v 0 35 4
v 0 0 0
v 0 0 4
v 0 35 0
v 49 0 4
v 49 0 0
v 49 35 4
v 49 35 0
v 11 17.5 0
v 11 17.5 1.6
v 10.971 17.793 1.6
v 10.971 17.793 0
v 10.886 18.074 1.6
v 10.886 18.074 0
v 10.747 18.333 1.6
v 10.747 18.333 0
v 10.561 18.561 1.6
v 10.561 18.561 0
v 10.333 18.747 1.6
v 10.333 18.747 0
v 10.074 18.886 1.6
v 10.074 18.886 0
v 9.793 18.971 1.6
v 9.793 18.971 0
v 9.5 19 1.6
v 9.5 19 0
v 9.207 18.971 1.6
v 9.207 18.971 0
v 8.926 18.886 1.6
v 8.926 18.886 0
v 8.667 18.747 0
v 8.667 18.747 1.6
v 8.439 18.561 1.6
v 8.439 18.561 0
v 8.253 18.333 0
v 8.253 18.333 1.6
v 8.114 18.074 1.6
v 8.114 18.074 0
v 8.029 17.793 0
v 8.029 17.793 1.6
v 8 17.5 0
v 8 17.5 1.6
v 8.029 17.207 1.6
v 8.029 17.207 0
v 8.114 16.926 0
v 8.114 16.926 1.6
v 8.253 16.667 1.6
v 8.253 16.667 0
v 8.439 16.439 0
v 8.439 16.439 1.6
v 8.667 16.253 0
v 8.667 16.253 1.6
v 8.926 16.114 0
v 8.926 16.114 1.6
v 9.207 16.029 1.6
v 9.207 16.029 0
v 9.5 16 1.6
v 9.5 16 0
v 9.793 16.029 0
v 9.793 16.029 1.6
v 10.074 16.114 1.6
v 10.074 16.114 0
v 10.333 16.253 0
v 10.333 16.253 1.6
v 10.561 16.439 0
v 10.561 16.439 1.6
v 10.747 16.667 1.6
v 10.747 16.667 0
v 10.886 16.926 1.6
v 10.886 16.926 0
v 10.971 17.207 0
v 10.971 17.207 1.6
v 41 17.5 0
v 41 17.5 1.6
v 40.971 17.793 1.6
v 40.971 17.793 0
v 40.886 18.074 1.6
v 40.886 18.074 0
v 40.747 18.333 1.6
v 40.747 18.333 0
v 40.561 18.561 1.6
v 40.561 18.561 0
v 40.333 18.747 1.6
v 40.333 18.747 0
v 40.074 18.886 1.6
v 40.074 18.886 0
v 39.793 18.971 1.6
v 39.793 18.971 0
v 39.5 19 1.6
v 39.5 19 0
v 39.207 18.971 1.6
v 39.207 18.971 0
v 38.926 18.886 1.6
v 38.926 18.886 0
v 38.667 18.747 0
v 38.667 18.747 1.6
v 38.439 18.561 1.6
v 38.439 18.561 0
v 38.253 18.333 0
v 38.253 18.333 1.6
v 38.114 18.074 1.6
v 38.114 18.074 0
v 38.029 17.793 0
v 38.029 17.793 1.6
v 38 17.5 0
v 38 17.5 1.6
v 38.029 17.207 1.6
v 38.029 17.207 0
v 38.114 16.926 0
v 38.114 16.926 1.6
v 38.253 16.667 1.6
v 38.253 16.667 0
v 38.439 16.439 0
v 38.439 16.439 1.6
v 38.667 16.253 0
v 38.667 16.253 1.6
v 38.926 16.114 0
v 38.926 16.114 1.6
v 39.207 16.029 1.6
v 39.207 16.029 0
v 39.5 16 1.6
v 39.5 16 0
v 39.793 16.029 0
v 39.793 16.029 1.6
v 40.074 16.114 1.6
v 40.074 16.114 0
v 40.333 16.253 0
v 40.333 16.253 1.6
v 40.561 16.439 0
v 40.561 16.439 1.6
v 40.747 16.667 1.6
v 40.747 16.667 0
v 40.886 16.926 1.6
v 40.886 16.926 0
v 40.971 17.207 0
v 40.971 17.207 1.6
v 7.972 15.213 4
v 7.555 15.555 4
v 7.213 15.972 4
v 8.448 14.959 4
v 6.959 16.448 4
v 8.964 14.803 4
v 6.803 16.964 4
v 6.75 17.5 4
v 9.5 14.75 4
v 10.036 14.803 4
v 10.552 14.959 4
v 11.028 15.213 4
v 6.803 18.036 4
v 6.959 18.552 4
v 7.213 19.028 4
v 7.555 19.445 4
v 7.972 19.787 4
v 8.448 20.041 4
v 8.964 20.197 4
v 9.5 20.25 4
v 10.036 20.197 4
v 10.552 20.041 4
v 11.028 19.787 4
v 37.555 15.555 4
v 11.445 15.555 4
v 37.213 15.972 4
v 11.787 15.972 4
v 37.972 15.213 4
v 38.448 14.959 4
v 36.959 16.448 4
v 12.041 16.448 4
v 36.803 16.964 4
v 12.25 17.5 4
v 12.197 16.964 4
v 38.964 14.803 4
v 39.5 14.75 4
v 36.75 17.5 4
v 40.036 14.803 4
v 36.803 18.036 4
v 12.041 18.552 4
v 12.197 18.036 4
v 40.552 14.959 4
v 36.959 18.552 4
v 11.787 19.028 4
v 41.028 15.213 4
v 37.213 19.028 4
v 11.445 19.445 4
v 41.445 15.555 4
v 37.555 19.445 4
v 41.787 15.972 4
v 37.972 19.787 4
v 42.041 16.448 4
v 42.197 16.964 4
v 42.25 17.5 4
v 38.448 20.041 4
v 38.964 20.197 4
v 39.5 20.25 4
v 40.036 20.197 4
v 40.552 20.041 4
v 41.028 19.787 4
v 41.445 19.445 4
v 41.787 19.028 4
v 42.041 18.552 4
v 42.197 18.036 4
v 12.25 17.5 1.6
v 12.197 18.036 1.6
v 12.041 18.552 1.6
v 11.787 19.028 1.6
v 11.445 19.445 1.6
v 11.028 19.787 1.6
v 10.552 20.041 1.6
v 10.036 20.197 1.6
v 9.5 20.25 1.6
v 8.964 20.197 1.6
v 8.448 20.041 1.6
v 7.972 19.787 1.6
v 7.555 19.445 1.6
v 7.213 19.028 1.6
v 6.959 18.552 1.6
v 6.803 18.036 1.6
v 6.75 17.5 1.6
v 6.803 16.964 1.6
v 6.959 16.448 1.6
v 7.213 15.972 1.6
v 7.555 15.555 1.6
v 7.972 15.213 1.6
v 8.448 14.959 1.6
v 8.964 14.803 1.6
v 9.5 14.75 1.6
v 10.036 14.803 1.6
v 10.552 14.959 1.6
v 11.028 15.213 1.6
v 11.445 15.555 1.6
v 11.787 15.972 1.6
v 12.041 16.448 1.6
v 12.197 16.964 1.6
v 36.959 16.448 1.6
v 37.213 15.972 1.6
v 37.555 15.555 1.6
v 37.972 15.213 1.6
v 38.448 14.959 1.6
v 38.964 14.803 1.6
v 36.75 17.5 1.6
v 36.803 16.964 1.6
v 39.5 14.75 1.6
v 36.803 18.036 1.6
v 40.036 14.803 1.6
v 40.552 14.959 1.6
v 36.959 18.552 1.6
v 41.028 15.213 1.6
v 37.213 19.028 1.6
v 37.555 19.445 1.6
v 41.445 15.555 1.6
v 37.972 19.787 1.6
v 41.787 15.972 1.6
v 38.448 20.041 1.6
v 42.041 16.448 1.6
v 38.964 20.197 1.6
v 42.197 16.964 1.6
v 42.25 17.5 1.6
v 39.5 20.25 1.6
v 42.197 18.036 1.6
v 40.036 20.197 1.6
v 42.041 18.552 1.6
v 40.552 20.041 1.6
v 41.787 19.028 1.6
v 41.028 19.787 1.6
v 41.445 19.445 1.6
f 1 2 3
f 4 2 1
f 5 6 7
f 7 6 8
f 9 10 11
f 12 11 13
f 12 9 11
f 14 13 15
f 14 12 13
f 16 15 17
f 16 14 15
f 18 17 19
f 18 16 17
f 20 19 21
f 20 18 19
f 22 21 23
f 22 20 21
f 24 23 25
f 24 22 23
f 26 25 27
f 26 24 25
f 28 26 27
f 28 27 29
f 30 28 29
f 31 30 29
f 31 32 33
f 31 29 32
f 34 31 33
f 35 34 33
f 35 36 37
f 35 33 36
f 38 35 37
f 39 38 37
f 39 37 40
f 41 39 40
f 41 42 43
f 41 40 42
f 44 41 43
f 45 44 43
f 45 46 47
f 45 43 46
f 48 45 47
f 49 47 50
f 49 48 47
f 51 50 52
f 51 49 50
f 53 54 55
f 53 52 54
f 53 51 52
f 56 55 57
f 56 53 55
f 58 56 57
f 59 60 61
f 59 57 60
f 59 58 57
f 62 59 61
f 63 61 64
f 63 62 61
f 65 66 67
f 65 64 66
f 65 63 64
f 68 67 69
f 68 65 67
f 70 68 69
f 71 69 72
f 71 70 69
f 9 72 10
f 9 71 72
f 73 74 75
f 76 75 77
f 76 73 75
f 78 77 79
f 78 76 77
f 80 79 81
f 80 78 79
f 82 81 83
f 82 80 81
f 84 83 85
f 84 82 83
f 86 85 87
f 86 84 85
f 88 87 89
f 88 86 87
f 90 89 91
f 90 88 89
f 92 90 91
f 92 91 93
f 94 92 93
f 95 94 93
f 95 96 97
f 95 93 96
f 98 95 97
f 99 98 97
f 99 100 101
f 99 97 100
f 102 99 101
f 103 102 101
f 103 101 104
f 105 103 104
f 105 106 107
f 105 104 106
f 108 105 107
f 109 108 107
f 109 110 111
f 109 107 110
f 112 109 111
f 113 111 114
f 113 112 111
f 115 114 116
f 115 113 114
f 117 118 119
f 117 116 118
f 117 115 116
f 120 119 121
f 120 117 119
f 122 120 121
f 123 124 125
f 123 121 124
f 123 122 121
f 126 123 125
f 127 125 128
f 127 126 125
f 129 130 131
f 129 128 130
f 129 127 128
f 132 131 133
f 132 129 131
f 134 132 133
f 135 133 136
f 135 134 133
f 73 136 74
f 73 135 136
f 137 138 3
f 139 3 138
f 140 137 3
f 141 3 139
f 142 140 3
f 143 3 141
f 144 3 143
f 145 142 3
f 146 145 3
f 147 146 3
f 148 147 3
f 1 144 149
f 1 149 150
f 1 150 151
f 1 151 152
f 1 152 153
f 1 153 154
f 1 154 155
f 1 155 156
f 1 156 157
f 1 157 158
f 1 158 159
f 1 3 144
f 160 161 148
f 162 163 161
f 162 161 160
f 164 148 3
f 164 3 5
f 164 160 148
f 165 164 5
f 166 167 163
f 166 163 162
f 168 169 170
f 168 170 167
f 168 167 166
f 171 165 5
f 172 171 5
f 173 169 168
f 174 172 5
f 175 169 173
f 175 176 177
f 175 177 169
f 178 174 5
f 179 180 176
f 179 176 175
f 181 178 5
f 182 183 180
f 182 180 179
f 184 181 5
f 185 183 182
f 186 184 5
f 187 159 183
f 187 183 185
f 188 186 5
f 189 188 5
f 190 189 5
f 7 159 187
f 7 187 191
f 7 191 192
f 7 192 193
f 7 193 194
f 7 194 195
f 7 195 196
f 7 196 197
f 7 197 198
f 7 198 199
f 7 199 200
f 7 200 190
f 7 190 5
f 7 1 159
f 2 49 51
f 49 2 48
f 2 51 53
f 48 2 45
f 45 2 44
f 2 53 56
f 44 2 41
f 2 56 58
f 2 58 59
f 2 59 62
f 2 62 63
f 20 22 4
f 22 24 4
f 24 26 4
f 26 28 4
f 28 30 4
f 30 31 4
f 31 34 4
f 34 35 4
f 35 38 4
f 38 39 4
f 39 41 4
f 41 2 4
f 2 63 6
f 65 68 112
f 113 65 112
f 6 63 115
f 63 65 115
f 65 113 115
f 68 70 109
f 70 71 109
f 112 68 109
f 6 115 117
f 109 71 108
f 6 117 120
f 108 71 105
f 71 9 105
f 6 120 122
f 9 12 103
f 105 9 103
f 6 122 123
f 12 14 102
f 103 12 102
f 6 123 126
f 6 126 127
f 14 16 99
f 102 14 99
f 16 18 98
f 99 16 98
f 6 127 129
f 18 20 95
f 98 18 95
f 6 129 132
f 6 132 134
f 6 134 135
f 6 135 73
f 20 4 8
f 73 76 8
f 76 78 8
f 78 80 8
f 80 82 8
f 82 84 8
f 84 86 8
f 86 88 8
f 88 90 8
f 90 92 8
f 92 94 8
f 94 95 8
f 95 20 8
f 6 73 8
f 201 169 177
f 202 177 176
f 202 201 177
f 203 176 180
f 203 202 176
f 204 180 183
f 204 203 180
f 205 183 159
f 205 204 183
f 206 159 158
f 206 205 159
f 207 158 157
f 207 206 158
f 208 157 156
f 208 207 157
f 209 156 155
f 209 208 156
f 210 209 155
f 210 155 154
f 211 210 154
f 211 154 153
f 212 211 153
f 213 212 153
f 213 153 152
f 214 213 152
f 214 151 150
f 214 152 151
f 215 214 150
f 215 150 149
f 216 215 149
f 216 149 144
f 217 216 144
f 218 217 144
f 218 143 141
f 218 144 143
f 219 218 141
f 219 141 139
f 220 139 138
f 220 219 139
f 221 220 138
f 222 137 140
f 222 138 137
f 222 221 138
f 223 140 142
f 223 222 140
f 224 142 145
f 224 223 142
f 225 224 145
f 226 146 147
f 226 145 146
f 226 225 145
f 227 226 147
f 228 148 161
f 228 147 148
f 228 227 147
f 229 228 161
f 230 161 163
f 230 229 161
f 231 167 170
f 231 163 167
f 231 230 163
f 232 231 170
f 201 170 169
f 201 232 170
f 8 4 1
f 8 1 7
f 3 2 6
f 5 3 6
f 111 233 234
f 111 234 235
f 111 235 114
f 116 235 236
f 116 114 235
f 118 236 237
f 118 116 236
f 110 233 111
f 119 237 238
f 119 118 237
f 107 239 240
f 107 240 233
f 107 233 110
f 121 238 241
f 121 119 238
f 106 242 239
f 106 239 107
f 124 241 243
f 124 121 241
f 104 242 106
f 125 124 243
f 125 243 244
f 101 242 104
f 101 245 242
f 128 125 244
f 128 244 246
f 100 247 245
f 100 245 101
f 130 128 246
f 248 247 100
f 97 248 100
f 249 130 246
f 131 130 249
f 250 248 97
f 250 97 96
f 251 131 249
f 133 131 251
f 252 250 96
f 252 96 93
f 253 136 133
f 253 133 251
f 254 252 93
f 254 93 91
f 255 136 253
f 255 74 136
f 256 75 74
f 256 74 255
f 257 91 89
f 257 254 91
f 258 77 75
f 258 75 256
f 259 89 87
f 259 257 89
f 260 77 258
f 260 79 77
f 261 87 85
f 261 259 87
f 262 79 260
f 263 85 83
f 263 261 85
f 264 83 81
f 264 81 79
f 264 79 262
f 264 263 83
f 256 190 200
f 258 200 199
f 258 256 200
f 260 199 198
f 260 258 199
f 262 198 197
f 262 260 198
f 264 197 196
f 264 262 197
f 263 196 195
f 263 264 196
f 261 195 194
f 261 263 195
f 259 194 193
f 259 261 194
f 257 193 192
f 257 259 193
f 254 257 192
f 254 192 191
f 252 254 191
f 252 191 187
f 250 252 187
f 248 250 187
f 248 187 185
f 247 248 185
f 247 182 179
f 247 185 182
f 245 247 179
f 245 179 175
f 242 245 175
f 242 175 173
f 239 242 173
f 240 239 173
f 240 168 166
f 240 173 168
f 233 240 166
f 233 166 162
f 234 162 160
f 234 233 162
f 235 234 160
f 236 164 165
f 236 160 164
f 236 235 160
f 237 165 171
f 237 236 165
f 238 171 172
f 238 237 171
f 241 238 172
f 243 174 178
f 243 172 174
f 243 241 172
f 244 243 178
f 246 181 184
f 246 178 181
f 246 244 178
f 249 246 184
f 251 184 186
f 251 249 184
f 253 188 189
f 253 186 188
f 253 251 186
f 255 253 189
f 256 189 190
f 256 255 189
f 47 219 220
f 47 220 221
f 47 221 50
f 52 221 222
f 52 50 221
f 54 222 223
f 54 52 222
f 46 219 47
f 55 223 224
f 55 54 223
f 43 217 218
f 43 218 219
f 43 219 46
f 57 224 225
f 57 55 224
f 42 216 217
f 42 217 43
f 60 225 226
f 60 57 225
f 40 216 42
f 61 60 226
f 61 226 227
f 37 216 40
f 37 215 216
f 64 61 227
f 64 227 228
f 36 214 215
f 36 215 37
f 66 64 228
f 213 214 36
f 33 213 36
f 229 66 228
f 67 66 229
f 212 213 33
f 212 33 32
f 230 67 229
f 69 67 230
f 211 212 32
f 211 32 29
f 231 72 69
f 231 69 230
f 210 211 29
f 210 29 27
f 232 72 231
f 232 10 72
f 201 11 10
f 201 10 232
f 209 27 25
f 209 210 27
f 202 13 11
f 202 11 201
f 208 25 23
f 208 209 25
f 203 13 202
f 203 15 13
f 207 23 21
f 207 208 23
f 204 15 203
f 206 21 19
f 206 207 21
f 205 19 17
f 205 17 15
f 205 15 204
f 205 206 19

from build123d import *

# Parameters (mm, degrees)
CYLINDER003_R     = 2.75
CYLINDER003_DEPTH = 3.4
CYLINDER002_R     = 1.5
CYLINDER002_DEPTH = 5
CYLINDER001_R     = 2.75
CYLINDER001_DEPTH = 3.4
CYLINDER_R        = 1.5
CYLINDER_DEPTH    = 5
BOX_W             = 49
BOX_H             = 35
BOX_DEPTH         = 4


with BuildPart() as cylinder003:
    # Cylinder003 → Cylinder003 (new body)
    with BuildSketch(Plane.XY.offset(11.6)):
        Circle(CYLINDER003_R)
    extrude(amount=CYLINDER003_DEPTH)


with BuildPart() as fusion001:
    # Cylinder002 → Cylinder002 (new body)
    with BuildSketch(Plane.XY.offset(10)):
        Circle(CYLINDER002_R)
    extrude(amount=CYLINDER002_DEPTH)

    # Fusion001: union Cylinder003
    add(cylinder003.part)


with BuildPart() as fusion001_1:
    # Fusion001 placement: moved
    add(fusion001.part.moved(Location((39.5, 17.5, -10))))


with BuildPart() as cylinder001:
    # Cylinder001 → Cylinder001 (new body)
    with BuildSketch(Plane.XY.offset(11.6)):
        Circle(CYLINDER001_R)
    extrude(amount=CYLINDER001_DEPTH)


with BuildPart() as fusion:
    # Cylinder → Cylinder (new body)
    with BuildSketch(Plane.XY.offset(10)):
        Circle(CYLINDER_R)
    extrude(amount=CYLINDER_DEPTH)

    # Fusion: union Cylinder001
    add(cylinder001.part)


with BuildPart() as fusion_1:
    # Fusion placement: moved
    add(fusion.part.moved(Location((9.5, 17.5, -10))))


with BuildPart() as soporte_para_minibreadboard:
    # Box → Box (new body)
    with BuildSketch(Plane.XY):
        with Locations((24.5, 17.5)):
            Rectangle(BOX_W, BOX_H)
    extrude(amount=BOX_DEPTH)

    # Cut: cut Fusion
    add(fusion_1.part, mode=Mode.SUBTRACT)

    # Cut001: cut Fusion001
    add(fusion001_1.part, mode=Mode.SUBTRACT)


solid = soporte_para_minibreadboard.part
